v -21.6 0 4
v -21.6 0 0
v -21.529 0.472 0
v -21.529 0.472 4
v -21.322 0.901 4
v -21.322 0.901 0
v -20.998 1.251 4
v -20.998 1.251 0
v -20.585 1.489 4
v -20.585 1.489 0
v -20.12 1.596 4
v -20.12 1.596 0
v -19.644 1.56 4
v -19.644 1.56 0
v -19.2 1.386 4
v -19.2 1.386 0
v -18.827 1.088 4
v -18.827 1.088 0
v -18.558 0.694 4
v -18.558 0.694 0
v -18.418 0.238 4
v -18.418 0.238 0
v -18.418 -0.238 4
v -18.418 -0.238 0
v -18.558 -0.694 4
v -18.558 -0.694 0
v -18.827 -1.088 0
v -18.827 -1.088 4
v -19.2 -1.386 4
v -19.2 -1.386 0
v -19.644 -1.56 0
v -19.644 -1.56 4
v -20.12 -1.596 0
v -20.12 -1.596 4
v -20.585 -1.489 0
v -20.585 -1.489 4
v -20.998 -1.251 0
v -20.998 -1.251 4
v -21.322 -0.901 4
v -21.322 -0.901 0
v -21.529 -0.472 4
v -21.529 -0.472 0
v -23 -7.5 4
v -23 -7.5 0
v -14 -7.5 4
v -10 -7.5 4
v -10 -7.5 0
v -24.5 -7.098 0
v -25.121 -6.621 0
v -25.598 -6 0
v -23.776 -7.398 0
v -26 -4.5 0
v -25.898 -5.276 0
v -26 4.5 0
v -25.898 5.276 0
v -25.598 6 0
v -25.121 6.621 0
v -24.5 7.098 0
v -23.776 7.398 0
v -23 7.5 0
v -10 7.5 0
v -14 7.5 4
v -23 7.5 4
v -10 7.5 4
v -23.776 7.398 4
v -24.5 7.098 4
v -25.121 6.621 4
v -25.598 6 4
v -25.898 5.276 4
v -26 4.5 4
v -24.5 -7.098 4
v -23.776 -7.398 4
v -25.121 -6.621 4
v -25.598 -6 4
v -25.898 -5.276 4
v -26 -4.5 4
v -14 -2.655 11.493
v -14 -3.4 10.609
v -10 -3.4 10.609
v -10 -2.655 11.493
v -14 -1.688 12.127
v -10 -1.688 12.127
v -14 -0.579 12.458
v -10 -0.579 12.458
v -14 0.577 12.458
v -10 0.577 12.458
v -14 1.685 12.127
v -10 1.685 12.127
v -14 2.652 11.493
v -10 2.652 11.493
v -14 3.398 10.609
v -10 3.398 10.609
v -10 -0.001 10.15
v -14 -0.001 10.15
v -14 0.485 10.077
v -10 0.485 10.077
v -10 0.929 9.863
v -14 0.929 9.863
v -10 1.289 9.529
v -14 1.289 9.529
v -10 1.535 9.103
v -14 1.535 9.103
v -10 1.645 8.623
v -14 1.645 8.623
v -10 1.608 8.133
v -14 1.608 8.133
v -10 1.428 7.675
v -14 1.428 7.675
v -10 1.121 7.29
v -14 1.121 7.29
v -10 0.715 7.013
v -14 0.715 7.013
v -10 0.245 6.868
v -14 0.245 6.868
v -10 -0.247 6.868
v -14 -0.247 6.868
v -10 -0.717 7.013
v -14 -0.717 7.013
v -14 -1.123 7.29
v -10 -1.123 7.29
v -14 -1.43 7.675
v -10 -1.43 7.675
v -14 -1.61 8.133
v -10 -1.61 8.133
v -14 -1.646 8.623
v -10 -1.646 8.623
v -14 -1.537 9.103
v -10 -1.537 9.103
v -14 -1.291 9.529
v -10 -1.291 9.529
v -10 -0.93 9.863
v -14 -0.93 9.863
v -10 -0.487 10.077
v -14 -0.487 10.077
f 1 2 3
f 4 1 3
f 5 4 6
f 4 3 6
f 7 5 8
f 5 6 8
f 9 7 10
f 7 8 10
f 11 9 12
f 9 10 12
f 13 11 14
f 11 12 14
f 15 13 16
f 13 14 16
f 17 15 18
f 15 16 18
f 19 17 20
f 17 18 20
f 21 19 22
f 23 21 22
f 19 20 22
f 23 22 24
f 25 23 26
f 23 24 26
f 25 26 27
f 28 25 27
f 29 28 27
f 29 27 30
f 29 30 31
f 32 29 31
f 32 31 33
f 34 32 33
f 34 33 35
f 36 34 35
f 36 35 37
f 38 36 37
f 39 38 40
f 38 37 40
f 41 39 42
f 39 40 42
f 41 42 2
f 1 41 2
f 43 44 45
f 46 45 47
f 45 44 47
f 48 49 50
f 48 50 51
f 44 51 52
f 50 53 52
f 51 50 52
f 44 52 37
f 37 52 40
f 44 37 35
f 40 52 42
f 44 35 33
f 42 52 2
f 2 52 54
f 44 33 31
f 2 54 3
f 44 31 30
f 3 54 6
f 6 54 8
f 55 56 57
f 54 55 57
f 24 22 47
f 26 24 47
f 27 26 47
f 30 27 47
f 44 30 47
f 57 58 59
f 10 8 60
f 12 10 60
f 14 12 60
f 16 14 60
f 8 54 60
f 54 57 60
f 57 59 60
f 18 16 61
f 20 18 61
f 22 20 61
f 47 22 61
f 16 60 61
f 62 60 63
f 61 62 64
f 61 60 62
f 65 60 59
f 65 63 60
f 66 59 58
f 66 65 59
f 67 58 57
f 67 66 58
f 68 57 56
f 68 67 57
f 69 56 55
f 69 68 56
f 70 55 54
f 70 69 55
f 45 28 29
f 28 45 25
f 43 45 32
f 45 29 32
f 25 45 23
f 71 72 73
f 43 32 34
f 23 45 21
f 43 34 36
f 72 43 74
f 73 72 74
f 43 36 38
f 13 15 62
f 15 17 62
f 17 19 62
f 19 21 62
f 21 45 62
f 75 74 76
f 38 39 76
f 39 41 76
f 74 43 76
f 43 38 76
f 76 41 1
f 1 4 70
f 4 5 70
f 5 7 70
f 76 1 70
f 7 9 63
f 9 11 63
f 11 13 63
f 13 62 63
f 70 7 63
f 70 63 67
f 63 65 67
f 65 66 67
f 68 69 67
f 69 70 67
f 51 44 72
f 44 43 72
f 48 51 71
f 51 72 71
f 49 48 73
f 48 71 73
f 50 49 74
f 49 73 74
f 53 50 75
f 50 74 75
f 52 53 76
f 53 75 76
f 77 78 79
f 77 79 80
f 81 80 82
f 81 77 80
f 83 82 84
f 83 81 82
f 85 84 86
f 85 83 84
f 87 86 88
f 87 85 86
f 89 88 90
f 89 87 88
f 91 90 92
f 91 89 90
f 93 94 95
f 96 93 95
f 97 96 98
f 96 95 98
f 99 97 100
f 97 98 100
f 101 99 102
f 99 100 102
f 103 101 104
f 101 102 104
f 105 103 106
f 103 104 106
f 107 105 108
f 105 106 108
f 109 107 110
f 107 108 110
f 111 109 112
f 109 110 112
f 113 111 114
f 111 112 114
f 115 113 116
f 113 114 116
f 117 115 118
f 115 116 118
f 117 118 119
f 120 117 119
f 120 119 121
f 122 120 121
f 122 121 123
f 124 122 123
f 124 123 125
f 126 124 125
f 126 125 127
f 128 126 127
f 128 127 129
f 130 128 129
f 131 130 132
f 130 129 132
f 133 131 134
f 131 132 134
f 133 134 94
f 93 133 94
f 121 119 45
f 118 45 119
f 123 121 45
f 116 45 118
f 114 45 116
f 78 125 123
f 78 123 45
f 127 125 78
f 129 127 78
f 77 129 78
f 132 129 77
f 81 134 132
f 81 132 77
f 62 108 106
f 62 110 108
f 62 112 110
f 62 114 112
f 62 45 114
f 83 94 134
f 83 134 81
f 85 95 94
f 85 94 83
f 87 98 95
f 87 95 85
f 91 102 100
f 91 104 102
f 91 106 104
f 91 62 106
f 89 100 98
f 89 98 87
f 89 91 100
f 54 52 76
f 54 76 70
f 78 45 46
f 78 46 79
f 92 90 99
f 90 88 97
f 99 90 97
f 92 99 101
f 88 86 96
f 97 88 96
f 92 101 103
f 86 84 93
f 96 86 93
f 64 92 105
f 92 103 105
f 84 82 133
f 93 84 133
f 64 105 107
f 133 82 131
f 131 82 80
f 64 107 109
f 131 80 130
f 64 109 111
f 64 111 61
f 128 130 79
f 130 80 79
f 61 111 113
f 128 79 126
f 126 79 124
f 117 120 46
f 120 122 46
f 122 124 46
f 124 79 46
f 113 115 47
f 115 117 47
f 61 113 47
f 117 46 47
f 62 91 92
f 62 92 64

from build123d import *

# Parameters (mm, degrees)
SKETCH1_W           = 28
SKETCH1_H           = 15
BOSS_EXTRUDE1_DEPTH = 4
SKETCH3_R           = 4
SKETCH3_R_2         = 1.65
BOSS_EXTRUDE2_DEPTH = 4
SKETCH5_W           = 12
SKETCH5_H           = 15
SKETCH5_R           = 1.6
BOSS_EXTRUDE3_DEPTH = 4
FILLET1_R           = 3
CUT_EXTRUDE1_DEPTH  = 15


with BuildPart() as part:
    # Sketch1 → Boss-Extrude1 (new body)
    with BuildSketch(Plane.XY):
        Rectangle(SKETCH1_W, SKETCH1_H)
    extrude(amount=BOSS_EXTRUDE1_DEPTH)

    # Sketch3 → Boss-Extrude2 (add)
    with BuildSketch(Plane.ZY.offset(14)):
        with BuildLine():
            Line((10.609415807, 3.397699996), (4, 7.5))
            Line((4, 7.5), (4, -7.5))
            Line((4, -7.5), (10.608760269, -3.399872364))
            ThreePointArc((10.608760269, -3.399872364), (4.500000019, -0.000497042), (10.609415807, 3.397699996))
        make_face()
        with Locations((8.5, -0.00088279)):
            Circle(SKETCH3_R)
        with Locations((8.5, -0.00088279)):
            Circle(SKETCH3_R_2, mode=Mode.SUBTRACT)
    boss_extrude2 = extrude(amount=-BOSS_EXTRUDE2_DEPTH)

    # Sketch5 → Boss-Extrude3 (add)
    with BuildSketch(Plane(origin=(0, 0, 0), x_dir=(-1, 0, 0), z_dir=(0, 0, -1))):
        with Locations((20, 0)):
            Rectangle(SKETCH5_W, SKETCH5_H)
        with Locations((20, 0)):
            Circle(SKETCH5_R, mode=Mode.SUBTRACT)
    boss_extrude3 = extrude(amount=-BOSS_EXTRUDE3_DEPTH)

    # Mirror1: Boss-Extrude2, Boss-Extrude3 across plane
    add(boss_extrude2.mirror(Plane(origin=(0, 0, 0), x_dir=(0, 0, 1), z_dir=(1, 0, 0))))
    add(boss_extrude3.mirror(Plane(origin=(0, 0, 0), x_dir=(0, 0, 1), z_dir=(1, 0, 0))))

    # Fillet1
    fillet1_edges = [part.edges().sort_by_distance(p)[0] for p in [
        (-26, 7.5, 2),
        (-26, -7.5, 2),
        (26, 7.5, 2),
        (26, -7.5, 2),
    ]]
    fillet(fillet1_edges, radius=FILLET1_R)

    # Sketch6 → Cut-Extrude1 (cut)
    with BuildSketch(Plane.XZ.offset(7.5)):
        Polygon((0, 0), (37.280314588, 0), (37.280314588, 22.501925167), (0, 22.501925167), (-10, 22.501925167), (-10, 0), align=None)
    extrude(amount=-CUT_EXTRUDE1_DEPTH, mode=Mode.SUBTRACT)


solid = part.part
